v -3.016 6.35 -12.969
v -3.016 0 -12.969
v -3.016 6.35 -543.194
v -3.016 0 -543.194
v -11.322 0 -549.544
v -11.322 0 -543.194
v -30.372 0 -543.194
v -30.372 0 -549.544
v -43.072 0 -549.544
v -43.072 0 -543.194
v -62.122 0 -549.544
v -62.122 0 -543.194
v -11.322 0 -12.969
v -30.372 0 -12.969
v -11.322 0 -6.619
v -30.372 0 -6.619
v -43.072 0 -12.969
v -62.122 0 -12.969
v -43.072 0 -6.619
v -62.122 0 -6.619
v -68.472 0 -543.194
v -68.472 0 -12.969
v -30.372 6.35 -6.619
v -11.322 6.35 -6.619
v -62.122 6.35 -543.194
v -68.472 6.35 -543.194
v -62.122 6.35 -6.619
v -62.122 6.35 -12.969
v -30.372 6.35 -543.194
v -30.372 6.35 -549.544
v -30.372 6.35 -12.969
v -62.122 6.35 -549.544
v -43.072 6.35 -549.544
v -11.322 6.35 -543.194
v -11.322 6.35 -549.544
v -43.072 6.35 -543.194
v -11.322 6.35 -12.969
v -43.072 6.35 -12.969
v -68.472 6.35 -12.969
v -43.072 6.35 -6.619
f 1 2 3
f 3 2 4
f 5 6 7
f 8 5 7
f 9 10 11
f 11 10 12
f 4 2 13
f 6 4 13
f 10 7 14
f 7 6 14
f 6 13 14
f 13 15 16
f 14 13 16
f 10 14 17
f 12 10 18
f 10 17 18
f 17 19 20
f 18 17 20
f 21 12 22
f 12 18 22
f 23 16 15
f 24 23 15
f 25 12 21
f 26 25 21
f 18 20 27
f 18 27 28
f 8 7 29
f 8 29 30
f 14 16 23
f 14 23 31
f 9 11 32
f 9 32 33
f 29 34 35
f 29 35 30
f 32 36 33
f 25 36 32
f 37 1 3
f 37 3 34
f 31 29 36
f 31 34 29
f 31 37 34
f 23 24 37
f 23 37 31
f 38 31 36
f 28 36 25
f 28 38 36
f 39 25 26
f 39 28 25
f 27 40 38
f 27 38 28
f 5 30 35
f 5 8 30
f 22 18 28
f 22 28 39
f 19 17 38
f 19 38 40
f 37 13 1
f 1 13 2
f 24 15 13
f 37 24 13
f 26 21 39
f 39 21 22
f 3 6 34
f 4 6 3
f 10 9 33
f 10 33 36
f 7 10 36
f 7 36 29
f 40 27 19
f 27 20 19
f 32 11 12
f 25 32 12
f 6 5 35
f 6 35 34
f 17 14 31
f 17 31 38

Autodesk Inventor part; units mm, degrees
ref_plane "YZ Plane" through (0, 0, 0) normal (1, 0, 0) x (0, 1, 0)
ref_plane "XZ Plane" through (0, 0, 0) normal (0, 1, 0) x (-1, 0, 0)
ref_plane "XY Plane" through (0, 0, 0) normal (0, 0, 1) x (1, 0, 0)
sketch "Sketch1" plane through (0, 0, 0) normal (0, 1, 0) x (-1, 0, 0)
  line L0 (3.0163, -12.9686) -> (3.0163, -543.1936)
  line L1 (68.4721, -543.1936) -> (68.4721, -12.9686)
  line L2 (62.1221, -6.6186) -> (62.1221, -12.9686)
  line L3 (62.1221, -12.9686) -> (68.4721, -12.9686)
  line L4 (30.3721, -6.6186) -> (30.3721, -12.9686)
  line L5 (30.3721, -12.9686) -> (43.0721, -12.9686)
  line L6 (43.0721, -12.9686) -> (43.0721, -6.6186)
  line L7 (62.1221, -6.6186) -> (43.0721, -6.6186)
  line L8 (30.3721, -6.6186) -> (11.3221, -6.6186)
  line L9 (11.3221, -6.6186) -> (11.3221, -12.9686)
  line L10 (11.3221, -12.9686) -> (3.0163, -12.9686)
  line L11 (62.1221, -549.5436) -> (62.1221, -543.1936)
  line L12 (62.1221, -543.1936) -> (68.4721, -543.1936)
  line L13 (62.1221, -549.5436) -> (43.0721, -549.5436)
  line L14 (43.0721, -549.5436) -> (43.0721, -543.1936)
  line L15 (62.1221, -543.1936) -> (62.1221, -549.5436)
  line L16 (30.3721, -549.5436) -> (11.3221, -549.5436)
  line L17 (11.3221, -549.5436) -> (11.3221, -543.1936)
  line L18 (30.3721, -543.1936) -> (30.3721, -549.5436)
  line L19 (43.0721, -543.1936) -> (30.3721, -543.1936)
  line L20 (11.3221, -549.5436) -> (30.3721, -549.5436)
  line L21 (43.0721, -549.5436) -> (62.1221, -549.5436)
  line L22 (11.3221, -543.1936) -> (3.0163, -543.1936)
  point P0 (0, 0)
  dimension "d6" = 65.4558
  dimension "d11" = 19.05
  dimension "d12" = 19.05
  dimension "d13" = 12.7
  dimension "d14" = 6.35
  dimension "d15" = 8.3058
  dimension "d16" = 6.35
  dimension "d17" = 6.35
  dimension "d26" = 8.3058
  dimension "d27" = 19.05
  dimension "d28" = 12.7
  dimension "d29" = 19.05
  dimension "d30" = 6.35
  dimension "d31" = 6.35
  dimension "d32" = 6.35
  dimension "d33" = 6.35
  dimension "d34" = 6.35
  dimension "d37" = 542.925
extrude "Extrusion1" add sketch "Sketch1" along normal blind 6.35
properties part number "Top Shelf V3"
